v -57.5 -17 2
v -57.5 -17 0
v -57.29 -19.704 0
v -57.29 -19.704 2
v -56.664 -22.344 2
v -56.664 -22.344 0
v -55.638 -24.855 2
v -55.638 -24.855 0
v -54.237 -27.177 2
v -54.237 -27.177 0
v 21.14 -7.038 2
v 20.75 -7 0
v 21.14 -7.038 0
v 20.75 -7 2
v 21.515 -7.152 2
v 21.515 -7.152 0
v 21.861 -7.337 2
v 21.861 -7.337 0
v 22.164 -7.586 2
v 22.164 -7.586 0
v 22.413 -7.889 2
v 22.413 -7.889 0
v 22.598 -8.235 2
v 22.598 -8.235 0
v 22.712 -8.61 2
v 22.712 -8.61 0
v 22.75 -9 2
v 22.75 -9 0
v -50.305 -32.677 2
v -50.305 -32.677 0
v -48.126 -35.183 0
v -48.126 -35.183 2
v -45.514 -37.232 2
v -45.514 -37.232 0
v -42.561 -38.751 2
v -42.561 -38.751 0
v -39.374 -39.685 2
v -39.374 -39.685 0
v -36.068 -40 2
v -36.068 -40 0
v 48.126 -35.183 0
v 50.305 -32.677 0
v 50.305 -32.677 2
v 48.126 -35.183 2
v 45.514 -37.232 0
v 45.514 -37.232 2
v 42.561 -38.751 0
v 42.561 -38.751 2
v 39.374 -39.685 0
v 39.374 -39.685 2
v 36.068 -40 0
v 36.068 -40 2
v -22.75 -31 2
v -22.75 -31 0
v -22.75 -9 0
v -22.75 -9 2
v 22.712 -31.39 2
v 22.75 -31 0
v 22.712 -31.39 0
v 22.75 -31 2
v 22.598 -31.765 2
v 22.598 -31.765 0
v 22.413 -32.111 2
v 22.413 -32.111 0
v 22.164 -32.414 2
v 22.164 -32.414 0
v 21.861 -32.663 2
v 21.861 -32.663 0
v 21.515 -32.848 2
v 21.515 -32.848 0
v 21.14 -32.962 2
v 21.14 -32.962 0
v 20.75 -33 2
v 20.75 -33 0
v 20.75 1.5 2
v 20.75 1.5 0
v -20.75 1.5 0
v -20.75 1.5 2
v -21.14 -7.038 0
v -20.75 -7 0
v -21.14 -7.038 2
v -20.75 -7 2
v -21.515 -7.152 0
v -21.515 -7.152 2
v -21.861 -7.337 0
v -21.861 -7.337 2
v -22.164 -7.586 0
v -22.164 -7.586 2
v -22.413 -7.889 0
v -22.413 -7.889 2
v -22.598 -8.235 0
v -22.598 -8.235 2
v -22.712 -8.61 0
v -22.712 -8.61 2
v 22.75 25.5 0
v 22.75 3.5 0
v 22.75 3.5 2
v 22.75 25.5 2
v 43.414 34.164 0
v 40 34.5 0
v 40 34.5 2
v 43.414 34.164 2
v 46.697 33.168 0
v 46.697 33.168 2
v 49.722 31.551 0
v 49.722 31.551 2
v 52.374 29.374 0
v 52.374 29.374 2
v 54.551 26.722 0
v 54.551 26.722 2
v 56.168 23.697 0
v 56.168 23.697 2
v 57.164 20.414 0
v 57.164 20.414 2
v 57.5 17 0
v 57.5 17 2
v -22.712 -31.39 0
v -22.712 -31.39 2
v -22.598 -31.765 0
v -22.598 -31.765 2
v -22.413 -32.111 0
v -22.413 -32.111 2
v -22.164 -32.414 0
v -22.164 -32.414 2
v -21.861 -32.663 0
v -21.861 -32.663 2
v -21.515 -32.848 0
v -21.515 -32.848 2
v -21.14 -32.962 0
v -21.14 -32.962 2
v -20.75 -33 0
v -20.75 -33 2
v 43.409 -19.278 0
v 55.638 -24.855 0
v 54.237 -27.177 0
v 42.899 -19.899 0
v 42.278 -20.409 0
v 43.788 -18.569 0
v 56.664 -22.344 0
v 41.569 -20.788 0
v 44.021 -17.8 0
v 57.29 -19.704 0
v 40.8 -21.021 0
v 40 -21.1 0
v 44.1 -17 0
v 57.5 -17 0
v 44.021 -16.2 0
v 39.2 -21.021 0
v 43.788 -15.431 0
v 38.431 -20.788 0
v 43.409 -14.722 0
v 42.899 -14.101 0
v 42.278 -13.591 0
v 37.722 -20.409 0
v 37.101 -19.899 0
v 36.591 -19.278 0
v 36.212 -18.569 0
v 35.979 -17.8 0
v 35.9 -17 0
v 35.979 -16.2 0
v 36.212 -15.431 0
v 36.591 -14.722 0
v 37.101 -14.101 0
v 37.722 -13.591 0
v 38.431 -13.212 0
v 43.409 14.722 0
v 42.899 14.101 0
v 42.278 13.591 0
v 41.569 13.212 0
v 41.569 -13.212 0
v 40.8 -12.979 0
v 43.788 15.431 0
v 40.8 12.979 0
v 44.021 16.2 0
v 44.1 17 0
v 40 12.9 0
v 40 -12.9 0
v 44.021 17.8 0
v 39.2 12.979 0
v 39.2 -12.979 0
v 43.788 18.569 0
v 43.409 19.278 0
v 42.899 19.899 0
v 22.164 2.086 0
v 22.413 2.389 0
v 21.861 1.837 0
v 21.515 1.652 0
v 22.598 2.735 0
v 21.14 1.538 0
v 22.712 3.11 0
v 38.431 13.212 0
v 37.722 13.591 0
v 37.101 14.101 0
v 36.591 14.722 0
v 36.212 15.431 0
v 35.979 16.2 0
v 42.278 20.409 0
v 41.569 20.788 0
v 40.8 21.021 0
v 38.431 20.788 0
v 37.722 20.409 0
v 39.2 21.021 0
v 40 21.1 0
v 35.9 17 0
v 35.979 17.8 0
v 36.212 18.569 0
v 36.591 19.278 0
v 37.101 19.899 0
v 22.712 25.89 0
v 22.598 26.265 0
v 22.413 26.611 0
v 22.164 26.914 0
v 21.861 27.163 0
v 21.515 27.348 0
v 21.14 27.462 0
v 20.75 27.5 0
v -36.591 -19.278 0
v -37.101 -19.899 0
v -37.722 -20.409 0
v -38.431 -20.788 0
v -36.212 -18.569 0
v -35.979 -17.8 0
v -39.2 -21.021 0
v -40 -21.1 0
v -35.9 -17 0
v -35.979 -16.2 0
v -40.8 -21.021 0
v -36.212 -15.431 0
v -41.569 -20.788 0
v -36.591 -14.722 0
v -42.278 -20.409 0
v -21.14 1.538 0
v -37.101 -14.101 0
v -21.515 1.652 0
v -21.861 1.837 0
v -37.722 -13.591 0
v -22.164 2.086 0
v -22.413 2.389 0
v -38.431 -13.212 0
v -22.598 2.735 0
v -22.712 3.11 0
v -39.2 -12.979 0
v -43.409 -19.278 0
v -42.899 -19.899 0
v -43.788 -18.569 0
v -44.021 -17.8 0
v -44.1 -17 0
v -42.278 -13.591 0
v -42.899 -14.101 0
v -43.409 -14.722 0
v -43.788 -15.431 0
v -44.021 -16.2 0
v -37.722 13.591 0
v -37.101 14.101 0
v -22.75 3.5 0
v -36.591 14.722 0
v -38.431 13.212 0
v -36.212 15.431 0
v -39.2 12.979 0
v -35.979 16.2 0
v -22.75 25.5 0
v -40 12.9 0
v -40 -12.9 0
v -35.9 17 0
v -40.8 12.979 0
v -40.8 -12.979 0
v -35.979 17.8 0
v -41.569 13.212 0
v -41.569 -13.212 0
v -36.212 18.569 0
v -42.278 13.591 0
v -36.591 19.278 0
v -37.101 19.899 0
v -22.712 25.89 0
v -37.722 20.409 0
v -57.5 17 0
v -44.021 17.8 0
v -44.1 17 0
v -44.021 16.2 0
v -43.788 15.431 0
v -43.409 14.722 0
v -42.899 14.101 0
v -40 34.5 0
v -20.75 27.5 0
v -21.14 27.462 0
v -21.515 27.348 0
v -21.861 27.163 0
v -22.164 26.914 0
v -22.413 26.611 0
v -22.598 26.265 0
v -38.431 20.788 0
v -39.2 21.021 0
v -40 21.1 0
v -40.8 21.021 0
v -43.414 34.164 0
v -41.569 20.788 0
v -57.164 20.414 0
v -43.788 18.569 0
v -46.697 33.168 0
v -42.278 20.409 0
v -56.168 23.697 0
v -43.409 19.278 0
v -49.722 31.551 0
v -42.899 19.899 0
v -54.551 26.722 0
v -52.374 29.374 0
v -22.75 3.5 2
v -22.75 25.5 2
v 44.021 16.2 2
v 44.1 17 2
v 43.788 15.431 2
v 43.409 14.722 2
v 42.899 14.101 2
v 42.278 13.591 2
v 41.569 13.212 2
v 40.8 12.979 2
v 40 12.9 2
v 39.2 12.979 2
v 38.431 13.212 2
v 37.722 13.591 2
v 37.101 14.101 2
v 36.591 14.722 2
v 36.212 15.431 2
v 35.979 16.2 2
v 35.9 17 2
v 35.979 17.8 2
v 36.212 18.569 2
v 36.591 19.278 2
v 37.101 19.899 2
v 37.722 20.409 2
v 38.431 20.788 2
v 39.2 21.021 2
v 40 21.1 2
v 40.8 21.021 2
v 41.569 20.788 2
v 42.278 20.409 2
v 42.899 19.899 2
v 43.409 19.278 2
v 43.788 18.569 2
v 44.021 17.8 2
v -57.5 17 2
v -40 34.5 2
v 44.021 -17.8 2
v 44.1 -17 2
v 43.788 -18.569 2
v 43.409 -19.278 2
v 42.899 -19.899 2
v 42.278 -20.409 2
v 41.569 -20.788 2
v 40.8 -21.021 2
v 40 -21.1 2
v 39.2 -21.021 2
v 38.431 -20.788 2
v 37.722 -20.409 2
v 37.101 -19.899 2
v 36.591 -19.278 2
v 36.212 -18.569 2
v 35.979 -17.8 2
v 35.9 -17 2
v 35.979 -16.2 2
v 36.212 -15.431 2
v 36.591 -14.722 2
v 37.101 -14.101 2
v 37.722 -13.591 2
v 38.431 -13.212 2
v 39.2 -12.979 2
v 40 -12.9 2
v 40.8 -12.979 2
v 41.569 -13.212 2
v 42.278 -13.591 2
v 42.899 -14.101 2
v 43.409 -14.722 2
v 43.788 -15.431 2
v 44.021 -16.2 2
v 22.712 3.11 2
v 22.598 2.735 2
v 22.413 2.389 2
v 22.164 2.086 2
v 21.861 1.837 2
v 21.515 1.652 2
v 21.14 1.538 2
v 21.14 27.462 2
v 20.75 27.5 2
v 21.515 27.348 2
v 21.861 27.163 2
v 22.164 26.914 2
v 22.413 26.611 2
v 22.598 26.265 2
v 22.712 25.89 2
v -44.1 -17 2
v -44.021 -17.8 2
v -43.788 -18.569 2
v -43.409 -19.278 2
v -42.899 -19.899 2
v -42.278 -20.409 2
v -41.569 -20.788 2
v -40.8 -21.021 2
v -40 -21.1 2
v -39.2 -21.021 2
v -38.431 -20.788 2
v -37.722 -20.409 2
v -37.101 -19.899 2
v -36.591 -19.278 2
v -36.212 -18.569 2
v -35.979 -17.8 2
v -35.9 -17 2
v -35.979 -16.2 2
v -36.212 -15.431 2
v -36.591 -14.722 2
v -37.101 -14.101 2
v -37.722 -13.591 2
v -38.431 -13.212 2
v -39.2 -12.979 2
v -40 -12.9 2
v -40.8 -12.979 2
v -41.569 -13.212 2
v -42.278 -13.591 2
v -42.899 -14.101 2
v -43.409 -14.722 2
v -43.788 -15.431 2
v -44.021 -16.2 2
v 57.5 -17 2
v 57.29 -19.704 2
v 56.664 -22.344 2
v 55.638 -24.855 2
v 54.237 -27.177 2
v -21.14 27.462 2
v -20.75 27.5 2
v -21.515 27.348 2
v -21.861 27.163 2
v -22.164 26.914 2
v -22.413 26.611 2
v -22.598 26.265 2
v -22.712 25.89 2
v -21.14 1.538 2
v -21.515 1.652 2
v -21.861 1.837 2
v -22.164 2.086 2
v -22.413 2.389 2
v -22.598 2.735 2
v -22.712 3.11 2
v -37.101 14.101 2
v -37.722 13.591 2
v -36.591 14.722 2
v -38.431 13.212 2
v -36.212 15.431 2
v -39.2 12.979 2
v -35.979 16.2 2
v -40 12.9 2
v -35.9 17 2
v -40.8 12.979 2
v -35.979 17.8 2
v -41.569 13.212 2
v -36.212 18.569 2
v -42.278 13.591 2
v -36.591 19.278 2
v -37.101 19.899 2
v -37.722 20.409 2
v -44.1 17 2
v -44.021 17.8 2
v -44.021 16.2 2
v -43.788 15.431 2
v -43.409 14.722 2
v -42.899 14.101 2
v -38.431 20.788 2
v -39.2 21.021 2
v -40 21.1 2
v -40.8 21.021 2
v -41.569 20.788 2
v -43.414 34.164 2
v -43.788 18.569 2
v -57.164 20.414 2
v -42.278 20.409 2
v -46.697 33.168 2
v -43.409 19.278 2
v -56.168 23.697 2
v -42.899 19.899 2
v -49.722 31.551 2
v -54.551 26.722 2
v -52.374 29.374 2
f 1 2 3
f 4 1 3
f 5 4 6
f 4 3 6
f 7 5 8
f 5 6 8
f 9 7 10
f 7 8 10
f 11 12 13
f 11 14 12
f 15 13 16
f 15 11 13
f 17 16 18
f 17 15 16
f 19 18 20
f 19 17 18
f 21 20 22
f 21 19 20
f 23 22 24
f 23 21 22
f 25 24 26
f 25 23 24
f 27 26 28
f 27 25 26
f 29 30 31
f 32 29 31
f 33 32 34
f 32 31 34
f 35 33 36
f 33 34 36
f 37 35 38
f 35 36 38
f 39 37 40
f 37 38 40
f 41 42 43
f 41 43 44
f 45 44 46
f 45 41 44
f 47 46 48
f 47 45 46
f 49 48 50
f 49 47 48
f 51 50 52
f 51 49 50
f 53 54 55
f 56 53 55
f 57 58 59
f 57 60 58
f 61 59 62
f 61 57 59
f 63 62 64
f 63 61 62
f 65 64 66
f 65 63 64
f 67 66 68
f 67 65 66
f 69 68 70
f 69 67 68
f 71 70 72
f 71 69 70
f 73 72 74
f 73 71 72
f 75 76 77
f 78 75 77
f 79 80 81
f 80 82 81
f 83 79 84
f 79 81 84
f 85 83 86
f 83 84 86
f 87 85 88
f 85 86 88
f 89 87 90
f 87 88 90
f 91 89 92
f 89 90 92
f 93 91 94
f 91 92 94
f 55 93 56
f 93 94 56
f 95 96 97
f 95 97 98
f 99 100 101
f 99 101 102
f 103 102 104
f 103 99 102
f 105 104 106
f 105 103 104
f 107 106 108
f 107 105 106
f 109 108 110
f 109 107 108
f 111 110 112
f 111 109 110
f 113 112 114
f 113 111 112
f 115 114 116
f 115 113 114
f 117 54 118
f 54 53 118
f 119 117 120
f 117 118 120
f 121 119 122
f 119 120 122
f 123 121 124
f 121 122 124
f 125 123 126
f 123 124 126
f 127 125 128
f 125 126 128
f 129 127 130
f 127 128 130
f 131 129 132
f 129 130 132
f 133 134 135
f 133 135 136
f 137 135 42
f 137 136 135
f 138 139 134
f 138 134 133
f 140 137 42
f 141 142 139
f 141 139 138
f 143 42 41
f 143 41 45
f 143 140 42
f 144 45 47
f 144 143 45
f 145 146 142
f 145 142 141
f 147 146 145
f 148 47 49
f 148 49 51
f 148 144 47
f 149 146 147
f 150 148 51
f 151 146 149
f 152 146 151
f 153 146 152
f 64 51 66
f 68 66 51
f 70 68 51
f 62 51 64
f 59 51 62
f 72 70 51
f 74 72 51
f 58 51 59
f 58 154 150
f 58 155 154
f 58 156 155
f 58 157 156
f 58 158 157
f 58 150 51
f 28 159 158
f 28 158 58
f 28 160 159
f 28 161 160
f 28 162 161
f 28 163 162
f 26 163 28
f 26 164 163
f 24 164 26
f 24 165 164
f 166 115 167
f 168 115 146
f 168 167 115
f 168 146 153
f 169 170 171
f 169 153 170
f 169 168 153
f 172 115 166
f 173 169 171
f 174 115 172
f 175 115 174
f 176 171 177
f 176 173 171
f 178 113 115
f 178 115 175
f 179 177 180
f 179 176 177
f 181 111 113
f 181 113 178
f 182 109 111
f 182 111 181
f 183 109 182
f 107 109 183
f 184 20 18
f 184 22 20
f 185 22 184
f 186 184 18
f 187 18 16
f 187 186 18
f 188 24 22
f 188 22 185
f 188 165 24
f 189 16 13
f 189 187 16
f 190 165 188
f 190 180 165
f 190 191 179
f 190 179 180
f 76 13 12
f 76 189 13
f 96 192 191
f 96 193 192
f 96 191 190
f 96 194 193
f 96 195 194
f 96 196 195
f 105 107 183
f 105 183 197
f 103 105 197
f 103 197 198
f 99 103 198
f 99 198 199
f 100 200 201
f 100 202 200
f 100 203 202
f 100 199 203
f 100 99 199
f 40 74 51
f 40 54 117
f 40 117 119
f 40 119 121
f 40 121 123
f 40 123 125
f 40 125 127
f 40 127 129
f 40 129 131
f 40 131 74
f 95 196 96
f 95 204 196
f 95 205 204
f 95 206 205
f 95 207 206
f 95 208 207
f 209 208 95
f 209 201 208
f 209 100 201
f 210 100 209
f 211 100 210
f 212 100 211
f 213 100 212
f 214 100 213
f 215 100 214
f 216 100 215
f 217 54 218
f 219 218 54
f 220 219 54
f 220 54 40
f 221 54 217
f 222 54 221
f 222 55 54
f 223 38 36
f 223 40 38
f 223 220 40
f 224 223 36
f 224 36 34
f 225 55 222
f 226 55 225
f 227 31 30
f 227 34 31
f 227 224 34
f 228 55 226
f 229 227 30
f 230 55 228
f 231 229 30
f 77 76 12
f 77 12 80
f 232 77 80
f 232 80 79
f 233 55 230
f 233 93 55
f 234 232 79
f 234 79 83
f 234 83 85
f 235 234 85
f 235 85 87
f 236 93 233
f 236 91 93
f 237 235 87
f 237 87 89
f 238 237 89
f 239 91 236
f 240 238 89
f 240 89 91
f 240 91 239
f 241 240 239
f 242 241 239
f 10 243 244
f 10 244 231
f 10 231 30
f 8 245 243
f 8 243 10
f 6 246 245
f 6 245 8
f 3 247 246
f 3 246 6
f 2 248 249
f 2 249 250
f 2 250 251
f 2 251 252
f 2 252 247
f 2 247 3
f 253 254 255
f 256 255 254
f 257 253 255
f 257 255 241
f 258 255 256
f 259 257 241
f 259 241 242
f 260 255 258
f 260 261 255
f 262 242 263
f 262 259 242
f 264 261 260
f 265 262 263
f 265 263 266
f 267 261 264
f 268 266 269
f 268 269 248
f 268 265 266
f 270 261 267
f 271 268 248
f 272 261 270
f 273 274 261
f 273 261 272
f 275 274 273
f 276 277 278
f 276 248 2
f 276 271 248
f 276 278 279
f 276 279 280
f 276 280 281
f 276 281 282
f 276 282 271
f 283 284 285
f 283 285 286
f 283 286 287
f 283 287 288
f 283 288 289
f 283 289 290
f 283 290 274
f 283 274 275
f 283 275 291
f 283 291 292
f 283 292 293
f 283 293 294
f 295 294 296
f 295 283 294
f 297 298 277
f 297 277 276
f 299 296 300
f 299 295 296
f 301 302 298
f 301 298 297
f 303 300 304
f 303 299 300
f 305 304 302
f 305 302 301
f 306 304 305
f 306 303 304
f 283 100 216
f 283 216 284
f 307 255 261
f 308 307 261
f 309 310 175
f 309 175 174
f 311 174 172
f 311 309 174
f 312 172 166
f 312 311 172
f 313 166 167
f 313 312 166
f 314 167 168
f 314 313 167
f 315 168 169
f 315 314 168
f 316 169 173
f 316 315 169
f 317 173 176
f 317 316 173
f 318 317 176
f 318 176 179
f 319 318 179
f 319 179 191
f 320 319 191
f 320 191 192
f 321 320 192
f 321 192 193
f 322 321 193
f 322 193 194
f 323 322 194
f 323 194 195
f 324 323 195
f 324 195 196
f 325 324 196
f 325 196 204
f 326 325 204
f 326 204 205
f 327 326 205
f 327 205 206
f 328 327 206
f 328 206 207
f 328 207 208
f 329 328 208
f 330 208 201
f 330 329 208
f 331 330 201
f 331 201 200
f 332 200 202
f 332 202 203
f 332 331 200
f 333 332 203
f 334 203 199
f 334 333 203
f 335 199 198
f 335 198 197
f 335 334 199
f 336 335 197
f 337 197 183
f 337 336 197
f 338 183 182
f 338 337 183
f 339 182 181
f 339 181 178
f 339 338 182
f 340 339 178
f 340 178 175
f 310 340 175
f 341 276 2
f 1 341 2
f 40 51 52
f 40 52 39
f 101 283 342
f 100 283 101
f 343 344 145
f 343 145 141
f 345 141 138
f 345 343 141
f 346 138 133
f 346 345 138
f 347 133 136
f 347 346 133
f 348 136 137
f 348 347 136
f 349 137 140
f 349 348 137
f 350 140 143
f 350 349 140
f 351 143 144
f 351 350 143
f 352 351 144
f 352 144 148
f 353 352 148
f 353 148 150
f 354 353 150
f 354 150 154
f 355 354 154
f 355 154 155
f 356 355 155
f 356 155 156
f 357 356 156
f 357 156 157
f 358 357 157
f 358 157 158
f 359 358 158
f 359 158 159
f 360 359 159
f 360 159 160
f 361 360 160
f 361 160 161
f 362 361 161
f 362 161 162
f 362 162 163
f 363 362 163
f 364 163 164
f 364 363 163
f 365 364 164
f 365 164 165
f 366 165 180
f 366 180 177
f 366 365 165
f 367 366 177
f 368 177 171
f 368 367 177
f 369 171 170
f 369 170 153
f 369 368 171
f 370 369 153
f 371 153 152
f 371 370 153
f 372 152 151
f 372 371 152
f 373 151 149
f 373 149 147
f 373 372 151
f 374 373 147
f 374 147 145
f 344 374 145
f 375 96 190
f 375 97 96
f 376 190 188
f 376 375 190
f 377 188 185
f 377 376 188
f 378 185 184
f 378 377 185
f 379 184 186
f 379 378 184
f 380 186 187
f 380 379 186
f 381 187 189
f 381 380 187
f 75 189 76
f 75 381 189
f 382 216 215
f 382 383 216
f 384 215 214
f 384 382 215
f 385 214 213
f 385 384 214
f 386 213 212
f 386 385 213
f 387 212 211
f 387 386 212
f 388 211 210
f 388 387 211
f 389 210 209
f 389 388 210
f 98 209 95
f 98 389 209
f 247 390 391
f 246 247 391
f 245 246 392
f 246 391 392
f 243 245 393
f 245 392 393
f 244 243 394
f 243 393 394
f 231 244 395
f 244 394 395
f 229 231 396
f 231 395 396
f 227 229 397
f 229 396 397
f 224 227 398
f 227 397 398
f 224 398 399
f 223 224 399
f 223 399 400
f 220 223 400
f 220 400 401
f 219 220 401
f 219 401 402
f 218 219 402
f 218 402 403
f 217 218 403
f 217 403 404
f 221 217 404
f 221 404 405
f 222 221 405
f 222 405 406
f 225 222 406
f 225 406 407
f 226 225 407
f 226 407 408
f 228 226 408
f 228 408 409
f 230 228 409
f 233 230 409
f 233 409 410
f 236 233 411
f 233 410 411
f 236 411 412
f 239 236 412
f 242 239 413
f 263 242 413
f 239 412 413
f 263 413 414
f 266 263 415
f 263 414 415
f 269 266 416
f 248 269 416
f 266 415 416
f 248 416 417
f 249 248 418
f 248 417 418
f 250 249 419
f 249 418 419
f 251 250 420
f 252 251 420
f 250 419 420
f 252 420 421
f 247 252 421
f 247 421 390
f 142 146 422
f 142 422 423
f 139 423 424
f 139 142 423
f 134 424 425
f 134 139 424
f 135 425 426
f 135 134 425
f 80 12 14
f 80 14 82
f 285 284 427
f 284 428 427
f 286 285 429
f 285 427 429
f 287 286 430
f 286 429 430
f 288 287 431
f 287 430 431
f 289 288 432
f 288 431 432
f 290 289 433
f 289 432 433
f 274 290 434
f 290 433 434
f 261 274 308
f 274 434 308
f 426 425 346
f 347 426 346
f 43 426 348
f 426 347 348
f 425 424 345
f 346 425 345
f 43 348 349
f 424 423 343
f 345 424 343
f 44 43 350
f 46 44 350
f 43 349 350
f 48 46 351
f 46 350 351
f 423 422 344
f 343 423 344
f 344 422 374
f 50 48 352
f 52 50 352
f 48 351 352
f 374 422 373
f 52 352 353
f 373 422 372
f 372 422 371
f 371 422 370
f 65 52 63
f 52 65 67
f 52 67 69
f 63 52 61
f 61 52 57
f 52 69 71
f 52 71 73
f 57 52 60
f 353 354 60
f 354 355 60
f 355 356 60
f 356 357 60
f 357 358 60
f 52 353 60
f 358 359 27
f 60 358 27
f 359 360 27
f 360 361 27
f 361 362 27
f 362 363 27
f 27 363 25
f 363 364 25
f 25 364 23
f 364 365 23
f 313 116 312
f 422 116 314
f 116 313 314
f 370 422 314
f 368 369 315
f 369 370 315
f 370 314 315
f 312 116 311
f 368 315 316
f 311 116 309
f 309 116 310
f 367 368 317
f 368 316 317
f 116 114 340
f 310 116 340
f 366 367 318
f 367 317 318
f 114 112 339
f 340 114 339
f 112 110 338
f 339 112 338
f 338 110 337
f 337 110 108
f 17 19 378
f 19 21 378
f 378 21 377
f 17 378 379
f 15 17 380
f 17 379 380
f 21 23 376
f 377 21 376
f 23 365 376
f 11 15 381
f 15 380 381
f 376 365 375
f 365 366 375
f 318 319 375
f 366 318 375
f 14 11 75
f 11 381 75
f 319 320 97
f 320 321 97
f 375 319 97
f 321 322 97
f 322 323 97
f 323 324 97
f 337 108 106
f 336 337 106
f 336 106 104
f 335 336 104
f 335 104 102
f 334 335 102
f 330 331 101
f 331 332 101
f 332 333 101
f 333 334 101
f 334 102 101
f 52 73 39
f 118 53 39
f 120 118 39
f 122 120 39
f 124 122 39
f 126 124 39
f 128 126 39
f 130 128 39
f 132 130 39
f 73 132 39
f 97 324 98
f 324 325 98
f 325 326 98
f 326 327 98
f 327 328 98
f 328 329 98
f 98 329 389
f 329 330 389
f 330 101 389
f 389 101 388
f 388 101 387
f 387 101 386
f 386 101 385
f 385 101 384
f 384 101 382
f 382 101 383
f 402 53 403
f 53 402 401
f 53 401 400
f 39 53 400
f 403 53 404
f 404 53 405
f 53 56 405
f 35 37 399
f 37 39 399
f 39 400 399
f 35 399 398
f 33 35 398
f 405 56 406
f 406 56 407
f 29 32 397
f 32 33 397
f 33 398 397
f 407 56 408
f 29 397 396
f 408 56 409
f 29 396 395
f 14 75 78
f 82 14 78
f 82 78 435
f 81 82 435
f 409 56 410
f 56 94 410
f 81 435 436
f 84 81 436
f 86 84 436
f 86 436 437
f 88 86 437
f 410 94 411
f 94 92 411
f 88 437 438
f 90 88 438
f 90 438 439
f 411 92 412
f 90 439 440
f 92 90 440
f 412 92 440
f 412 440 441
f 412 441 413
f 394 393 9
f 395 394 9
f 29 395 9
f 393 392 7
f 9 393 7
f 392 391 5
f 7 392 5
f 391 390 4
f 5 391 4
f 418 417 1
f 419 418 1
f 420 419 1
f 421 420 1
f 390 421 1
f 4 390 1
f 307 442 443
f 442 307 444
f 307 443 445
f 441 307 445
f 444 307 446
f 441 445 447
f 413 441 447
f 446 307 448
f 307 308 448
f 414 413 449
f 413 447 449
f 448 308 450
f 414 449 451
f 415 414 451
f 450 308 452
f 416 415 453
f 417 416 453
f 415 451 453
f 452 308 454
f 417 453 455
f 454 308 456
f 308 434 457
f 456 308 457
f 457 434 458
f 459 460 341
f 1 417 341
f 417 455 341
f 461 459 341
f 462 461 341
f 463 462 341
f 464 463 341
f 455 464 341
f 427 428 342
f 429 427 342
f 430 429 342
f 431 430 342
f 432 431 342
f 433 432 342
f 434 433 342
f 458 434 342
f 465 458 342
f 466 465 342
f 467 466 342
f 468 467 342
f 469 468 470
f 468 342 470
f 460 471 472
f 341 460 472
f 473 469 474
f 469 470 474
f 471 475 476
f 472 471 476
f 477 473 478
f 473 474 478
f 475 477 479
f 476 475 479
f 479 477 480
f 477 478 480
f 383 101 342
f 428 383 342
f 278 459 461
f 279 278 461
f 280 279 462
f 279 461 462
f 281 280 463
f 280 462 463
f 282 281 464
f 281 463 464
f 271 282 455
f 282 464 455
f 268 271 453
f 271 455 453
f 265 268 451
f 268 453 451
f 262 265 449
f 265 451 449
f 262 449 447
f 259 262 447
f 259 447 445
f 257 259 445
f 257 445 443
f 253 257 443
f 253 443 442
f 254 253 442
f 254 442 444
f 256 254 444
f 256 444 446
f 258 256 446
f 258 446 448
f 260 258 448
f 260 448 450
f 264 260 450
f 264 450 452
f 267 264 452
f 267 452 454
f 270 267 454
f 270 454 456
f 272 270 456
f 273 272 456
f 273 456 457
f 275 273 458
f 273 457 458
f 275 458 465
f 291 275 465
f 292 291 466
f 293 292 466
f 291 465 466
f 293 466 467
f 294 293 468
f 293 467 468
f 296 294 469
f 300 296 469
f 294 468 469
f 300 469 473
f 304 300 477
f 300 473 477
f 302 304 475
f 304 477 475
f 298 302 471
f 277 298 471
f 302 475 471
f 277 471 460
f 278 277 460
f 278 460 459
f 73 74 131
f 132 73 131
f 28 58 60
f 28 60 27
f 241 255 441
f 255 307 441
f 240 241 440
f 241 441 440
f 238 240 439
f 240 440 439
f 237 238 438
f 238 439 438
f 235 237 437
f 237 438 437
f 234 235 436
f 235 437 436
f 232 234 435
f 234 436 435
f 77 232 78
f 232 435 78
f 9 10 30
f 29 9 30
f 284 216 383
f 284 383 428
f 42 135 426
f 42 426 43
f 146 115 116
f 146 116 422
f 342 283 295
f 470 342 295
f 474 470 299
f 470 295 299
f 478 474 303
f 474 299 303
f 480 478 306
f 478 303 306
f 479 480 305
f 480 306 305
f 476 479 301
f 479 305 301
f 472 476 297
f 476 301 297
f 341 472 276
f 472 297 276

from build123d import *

# Parameters (mm, degrees)
F0_R     = 12.5
F0_W     = 22.75
F0_H     = 26
F1_DEPTH = 2
F2_DEPTH = 25
F3_R     = 2
F4_D     = 8.2


# Not quite as in the source:
# - a feature names something its author has since deleted; it is built from what else it names


with BuildPart() as f1:
    # F0 (on Top) → F1 (new body)
    with BuildSketch(Plane.XY):
        with BuildLine():
            Line((-22.75, 1.5), (-22.75, 27.5))
            Line((-22.75, 27.5), (0, 27.5))
            Line((0, 27.5), (0, 34.5))
            Line((0, 34.5), (-40, 34.5))
            ThreePointArc((-40, 34.5), (-52.3743686708, 29.3743686708), (-57.5, 17))
            Line((-57.5, 17), (-57.5, -17))
            ThreePointArc((-57.5, -17), (-56.6642107828, -22.3436016868), (-54.2366766871, -27.1767891256))
            Line((-54.2366766871, -27.1767891256), (-50.3051172775, -32.6767891256))
            ThreePointArc((-50.3051172775, -32.6767891256), (-44.0733200493, -38.0618734363), (-36.0684405904, -40))
            Line((-36.0684405904, -40), (0, -40))
            Line((0, -40), (0, -33))
            Line((0, -33), (-22.75, -33))
            Line((-22.75, -33), (-22.75, -7))
            Line((-22.75, -7), (0, -7))
            Line((0, -7), (0, 1.5))
            Line((0, 1.5), (-22.75, 1.5))
        make_face()
        with Locations((-40, -17)):
            Circle(F0_R, mode=Mode.SUBTRACT)
        with Locations((-40, 17)):
            Circle(F0_R, mode=Mode.SUBTRACT)
        with Locations((-11.375, 14.5)):
            Rectangle(F0_W, F0_H)
        with Locations((-11.375, -20)):
            Rectangle(F0_W, F0_H)
        with Locations((-40, 17)):
            Circle(F0_R)
        with Locations((-40, -17)):
            Circle(F0_R)
    extrude(amount=F1_DEPTH)

    # F0 (on Top) → F2 (cut)
    with BuildSketch(Plane.XY):
        with Locations((-11.375, 14.5)):
            Rectangle(F0_W, F0_H)
        with Locations((-11.375, -20)):
            Rectangle(F0_W, F0_H)
    extrude(amount=F2_DEPTH, mode=Mode.SUBTRACT)

    # F3
    f3_edges = [f1.edges().sort_by_distance(p)[0] for p in [
        (-22.75, 1.5, 1),
        (-22.75, 27.5, 1),
        (-22.75, -7, 1),
        (-22.75, -33, 1),
    ]]
    fillet(f3_edges, radius=F3_R)

    # F4 (through all)
    with Locations(Plane(origin=(0, 0, 0), x_dir=(1, 0, 0), z_dir=(0, 0, -1))):
        with Locations((-40, -17), (-40, 17)):
            Hole(F4_D / 2)

    # F5: F1 across plane


with BuildPart() as f1_1:
    add(f1.part)
    add(f1.part.mirror(Plane.YZ))


solid = f1_1.part
